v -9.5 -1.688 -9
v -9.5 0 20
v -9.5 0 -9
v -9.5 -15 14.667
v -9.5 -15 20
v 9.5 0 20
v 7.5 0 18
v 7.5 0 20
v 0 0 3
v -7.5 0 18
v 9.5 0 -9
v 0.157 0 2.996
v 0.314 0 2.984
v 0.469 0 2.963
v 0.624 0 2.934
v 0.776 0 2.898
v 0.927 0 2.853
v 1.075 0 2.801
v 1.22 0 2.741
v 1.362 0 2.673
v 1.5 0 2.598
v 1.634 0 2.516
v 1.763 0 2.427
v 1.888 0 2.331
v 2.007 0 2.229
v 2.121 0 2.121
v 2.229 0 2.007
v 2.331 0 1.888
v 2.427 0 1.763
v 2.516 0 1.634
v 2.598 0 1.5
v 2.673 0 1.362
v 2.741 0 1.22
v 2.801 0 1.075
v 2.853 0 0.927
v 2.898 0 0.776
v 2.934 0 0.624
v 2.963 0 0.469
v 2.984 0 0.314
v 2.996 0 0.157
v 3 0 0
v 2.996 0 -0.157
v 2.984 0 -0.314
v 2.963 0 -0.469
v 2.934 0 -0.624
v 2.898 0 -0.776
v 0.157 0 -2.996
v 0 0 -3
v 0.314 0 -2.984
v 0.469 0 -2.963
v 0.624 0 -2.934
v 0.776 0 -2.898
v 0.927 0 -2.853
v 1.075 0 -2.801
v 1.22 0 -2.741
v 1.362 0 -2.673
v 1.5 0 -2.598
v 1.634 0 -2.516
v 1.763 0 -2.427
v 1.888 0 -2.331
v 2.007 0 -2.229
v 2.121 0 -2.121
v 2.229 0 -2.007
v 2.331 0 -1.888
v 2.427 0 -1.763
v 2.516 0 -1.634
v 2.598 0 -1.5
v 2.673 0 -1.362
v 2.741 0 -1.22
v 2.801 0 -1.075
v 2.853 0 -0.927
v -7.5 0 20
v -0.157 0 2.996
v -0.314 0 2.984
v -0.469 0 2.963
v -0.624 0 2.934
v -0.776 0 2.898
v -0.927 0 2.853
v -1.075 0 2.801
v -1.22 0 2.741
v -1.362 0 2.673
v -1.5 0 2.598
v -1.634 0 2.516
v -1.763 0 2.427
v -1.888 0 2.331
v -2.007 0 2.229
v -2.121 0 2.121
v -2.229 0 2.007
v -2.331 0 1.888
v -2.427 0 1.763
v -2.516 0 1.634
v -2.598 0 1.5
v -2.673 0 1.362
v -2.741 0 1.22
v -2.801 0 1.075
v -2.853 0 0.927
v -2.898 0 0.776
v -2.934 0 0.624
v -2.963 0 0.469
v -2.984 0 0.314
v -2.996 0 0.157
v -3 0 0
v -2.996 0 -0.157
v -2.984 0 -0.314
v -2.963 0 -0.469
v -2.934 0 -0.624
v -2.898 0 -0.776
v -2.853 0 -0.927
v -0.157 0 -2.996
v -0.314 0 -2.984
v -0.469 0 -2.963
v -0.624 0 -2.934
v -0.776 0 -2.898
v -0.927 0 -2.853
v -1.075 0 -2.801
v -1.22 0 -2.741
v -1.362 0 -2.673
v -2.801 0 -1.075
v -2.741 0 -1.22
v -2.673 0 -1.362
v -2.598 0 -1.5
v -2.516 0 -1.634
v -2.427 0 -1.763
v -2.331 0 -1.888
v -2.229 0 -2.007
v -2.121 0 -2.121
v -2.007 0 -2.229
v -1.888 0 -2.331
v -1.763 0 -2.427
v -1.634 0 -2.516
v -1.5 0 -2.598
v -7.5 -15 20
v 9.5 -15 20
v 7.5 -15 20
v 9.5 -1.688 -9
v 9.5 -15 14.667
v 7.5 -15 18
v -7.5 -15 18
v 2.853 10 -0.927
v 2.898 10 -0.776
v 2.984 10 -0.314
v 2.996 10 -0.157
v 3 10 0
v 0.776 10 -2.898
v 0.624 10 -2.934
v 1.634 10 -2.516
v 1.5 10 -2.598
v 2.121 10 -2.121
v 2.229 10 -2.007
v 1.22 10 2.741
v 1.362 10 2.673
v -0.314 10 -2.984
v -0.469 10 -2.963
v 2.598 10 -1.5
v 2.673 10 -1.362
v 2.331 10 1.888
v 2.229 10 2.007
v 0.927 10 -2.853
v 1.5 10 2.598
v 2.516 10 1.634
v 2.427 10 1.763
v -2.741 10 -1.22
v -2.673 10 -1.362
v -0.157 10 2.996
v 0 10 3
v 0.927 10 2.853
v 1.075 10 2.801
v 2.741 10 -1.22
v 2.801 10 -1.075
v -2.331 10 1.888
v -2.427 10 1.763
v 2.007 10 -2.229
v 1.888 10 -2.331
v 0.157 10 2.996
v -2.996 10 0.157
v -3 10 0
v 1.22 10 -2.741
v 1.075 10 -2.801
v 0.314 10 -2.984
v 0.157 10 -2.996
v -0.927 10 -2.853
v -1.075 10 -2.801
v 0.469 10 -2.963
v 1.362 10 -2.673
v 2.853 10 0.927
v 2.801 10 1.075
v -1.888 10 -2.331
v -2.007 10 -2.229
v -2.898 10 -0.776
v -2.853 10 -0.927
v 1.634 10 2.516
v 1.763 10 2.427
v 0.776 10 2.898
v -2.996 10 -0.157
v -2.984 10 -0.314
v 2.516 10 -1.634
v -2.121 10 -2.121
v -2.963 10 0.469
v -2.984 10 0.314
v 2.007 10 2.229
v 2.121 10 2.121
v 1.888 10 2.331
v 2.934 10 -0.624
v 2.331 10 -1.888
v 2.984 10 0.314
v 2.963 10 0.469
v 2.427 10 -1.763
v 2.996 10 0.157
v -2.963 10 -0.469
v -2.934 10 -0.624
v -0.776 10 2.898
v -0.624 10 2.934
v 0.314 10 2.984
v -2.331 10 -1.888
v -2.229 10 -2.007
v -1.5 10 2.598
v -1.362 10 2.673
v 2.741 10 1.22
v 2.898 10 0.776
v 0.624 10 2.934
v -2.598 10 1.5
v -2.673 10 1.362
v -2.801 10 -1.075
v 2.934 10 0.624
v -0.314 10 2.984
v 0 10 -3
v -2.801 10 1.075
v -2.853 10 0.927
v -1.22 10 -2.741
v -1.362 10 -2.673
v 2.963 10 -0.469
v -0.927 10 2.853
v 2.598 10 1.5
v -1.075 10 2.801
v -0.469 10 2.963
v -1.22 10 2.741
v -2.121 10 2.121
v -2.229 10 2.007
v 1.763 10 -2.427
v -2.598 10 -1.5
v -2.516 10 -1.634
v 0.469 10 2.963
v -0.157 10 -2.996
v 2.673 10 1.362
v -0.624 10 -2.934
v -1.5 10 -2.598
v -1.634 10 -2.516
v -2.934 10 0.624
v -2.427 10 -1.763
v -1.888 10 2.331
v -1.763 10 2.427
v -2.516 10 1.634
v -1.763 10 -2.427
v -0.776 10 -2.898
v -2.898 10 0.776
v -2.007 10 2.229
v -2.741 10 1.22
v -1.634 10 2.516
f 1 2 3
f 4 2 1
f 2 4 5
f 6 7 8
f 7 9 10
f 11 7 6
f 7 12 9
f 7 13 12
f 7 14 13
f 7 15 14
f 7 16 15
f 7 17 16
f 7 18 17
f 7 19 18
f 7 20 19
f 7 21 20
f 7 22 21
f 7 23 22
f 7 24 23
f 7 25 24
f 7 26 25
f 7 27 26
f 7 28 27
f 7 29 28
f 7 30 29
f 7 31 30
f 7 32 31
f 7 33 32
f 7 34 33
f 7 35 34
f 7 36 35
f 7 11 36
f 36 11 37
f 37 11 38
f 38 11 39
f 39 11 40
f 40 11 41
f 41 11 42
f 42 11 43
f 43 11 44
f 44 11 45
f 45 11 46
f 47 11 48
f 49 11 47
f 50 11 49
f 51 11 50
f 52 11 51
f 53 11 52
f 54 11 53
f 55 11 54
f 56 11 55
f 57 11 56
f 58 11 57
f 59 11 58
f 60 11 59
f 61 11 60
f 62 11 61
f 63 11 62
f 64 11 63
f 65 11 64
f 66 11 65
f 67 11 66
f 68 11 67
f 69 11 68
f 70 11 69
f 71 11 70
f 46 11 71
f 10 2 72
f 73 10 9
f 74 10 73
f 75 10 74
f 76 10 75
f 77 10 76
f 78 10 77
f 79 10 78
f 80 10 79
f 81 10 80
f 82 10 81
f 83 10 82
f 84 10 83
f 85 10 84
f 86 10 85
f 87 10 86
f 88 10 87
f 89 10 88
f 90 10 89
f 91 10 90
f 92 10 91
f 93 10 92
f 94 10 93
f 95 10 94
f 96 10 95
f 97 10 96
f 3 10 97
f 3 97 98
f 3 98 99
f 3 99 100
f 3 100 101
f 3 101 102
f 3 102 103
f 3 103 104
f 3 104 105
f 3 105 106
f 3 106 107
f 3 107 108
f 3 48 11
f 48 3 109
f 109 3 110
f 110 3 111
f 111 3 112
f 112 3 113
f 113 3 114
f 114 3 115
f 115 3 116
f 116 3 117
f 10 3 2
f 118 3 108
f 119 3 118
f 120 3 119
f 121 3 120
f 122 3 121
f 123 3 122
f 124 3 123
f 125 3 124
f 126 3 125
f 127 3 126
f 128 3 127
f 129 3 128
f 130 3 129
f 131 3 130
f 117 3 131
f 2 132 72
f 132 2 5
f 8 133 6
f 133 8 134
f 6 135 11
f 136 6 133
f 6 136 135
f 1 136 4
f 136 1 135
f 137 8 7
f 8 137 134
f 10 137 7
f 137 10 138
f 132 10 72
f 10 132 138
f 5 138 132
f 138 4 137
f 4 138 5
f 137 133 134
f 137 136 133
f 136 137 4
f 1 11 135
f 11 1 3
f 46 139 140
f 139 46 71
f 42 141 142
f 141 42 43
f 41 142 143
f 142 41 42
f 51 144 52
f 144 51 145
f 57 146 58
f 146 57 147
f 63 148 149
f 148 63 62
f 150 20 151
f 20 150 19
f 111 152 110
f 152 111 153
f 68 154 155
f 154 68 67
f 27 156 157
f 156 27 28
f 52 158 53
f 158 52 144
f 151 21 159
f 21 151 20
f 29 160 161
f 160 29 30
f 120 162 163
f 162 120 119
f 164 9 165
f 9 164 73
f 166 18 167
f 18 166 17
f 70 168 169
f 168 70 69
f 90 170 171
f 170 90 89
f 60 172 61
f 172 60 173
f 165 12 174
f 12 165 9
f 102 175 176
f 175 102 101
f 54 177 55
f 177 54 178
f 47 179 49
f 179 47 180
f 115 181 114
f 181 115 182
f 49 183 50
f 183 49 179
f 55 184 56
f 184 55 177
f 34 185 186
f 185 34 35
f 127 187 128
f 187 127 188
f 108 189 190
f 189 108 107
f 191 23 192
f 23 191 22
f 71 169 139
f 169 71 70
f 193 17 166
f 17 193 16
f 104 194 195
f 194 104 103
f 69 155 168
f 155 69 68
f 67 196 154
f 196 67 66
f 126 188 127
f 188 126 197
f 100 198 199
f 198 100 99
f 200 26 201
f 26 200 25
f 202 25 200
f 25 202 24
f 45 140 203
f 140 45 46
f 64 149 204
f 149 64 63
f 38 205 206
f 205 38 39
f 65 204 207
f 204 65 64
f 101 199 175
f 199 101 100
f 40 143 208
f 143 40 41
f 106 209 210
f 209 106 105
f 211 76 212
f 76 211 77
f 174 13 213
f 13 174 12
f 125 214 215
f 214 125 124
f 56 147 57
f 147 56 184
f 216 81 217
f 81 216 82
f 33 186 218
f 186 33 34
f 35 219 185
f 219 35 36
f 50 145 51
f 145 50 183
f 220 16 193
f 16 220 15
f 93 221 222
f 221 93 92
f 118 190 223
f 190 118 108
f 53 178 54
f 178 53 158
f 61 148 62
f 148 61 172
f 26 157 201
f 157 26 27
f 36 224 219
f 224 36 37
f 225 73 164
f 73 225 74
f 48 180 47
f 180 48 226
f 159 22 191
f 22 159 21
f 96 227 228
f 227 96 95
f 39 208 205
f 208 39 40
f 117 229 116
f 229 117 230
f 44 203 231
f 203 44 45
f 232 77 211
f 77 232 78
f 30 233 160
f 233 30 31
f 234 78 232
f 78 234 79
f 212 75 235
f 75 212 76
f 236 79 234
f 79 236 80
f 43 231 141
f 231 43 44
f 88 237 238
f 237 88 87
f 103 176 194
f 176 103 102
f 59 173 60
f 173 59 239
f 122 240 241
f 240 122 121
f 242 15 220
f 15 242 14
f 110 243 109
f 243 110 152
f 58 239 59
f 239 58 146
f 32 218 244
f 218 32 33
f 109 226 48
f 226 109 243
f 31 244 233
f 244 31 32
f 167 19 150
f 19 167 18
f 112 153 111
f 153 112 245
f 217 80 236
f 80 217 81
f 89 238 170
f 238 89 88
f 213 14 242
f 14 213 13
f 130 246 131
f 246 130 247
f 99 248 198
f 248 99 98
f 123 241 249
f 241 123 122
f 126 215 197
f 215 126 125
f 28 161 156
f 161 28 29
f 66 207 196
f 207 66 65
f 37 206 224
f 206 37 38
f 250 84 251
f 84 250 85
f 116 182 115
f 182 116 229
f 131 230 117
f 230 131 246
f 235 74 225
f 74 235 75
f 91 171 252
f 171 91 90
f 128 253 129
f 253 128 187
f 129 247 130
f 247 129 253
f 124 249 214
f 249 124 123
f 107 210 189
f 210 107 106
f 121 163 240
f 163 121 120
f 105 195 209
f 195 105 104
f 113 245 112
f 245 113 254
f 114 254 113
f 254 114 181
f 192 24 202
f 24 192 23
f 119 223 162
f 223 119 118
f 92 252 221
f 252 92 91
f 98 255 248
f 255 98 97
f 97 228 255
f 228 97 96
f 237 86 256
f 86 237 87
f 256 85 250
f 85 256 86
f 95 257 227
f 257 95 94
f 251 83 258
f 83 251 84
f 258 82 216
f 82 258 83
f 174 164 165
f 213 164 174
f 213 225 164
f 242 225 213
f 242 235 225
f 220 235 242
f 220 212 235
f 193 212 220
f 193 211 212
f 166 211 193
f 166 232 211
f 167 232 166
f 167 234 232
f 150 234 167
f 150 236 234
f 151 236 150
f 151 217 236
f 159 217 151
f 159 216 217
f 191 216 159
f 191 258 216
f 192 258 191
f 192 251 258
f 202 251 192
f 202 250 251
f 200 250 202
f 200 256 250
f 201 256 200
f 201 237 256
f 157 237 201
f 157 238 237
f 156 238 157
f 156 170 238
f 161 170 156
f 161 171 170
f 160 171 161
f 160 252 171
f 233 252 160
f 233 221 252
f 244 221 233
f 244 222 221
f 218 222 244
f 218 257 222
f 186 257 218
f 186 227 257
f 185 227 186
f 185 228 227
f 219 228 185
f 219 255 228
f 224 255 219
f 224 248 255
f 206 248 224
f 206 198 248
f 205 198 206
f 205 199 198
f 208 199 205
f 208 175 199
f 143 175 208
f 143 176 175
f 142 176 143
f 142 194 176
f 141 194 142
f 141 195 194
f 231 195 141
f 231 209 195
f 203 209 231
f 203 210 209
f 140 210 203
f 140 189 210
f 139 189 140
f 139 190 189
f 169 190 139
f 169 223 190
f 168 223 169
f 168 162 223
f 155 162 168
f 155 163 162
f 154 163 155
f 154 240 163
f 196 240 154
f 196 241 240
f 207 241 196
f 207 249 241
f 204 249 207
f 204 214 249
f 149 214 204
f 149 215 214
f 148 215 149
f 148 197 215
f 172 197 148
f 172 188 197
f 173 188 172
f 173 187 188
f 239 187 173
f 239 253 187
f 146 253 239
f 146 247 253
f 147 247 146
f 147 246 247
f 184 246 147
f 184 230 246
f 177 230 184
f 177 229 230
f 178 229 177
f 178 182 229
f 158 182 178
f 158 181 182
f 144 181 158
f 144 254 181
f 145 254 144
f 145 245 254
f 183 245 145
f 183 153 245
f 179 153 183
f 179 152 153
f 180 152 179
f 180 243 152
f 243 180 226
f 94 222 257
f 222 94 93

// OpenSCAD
// A shelf support that prevents the normal support from pivoting out
// of the pin hole.

// number of faces on each cylinder
$fn=120;

ShelfSupport(10, 6, 18, 19, 15);

module ShelfSupport(pinLength, pinDiameter, supportOffset, width, depth) {
    // pinLength = length of pin in mm
    // pinDiameter = diameter of pin in mm
    // supportOffset = distance from pin centerline to shelf support surface in mm
    // width = width in mm
    // depth = depth in mm

    union() {
        // pin
        rotate(a=-90, v=[1, 0, 0]) {
            translate([0, 0, -1]) {
                cylinder(h=pinLength + 1, r=pinDiameter / 2);
            }
        }

        // body
        difference() {
            polyhedron(
                points=[
                    [-width / 2, 0, -(supportOffset / 2 + 3)],
                    [-width / 2, 0, supportOffset + 2],
                    [-width / 2, -(depth + 3), supportOffset + 2],
                    [width / 2, 0, -(supportOffset / 2 + 3)],
                    [width / 2, 0, supportOffset + 2],
                    [width / 2, -(depth + 3), supportOffset + 2]
                ],
                triangles=[
                    [0, 1, 2],
                    [3, 5, 4],
                    [3, 2, 5],
                    [2, 3, 0],
                    [2, 4, 5],
                    [4, 2, 1],
                    [0, 4, 1],
                    [4, 0, 3]
                ]
            );
            // cut shelf support surface
            translate([0, 0, supportOffset + 2]) {
                #cube(size=[width - 4, depth * 3, 4], center=true);
            }
            // cut front
            translate([0, -(depth + 5), supportOffset]) {
                #cube(size=[width + 2, 10, 10], center=true);
            }
            // cut bottom
            translate([0, 0, -(supportOffset / 2 + 5)]) {
                #cube(size=[width + 2, 10, 10], center=true);
            }
        }
    }
}
